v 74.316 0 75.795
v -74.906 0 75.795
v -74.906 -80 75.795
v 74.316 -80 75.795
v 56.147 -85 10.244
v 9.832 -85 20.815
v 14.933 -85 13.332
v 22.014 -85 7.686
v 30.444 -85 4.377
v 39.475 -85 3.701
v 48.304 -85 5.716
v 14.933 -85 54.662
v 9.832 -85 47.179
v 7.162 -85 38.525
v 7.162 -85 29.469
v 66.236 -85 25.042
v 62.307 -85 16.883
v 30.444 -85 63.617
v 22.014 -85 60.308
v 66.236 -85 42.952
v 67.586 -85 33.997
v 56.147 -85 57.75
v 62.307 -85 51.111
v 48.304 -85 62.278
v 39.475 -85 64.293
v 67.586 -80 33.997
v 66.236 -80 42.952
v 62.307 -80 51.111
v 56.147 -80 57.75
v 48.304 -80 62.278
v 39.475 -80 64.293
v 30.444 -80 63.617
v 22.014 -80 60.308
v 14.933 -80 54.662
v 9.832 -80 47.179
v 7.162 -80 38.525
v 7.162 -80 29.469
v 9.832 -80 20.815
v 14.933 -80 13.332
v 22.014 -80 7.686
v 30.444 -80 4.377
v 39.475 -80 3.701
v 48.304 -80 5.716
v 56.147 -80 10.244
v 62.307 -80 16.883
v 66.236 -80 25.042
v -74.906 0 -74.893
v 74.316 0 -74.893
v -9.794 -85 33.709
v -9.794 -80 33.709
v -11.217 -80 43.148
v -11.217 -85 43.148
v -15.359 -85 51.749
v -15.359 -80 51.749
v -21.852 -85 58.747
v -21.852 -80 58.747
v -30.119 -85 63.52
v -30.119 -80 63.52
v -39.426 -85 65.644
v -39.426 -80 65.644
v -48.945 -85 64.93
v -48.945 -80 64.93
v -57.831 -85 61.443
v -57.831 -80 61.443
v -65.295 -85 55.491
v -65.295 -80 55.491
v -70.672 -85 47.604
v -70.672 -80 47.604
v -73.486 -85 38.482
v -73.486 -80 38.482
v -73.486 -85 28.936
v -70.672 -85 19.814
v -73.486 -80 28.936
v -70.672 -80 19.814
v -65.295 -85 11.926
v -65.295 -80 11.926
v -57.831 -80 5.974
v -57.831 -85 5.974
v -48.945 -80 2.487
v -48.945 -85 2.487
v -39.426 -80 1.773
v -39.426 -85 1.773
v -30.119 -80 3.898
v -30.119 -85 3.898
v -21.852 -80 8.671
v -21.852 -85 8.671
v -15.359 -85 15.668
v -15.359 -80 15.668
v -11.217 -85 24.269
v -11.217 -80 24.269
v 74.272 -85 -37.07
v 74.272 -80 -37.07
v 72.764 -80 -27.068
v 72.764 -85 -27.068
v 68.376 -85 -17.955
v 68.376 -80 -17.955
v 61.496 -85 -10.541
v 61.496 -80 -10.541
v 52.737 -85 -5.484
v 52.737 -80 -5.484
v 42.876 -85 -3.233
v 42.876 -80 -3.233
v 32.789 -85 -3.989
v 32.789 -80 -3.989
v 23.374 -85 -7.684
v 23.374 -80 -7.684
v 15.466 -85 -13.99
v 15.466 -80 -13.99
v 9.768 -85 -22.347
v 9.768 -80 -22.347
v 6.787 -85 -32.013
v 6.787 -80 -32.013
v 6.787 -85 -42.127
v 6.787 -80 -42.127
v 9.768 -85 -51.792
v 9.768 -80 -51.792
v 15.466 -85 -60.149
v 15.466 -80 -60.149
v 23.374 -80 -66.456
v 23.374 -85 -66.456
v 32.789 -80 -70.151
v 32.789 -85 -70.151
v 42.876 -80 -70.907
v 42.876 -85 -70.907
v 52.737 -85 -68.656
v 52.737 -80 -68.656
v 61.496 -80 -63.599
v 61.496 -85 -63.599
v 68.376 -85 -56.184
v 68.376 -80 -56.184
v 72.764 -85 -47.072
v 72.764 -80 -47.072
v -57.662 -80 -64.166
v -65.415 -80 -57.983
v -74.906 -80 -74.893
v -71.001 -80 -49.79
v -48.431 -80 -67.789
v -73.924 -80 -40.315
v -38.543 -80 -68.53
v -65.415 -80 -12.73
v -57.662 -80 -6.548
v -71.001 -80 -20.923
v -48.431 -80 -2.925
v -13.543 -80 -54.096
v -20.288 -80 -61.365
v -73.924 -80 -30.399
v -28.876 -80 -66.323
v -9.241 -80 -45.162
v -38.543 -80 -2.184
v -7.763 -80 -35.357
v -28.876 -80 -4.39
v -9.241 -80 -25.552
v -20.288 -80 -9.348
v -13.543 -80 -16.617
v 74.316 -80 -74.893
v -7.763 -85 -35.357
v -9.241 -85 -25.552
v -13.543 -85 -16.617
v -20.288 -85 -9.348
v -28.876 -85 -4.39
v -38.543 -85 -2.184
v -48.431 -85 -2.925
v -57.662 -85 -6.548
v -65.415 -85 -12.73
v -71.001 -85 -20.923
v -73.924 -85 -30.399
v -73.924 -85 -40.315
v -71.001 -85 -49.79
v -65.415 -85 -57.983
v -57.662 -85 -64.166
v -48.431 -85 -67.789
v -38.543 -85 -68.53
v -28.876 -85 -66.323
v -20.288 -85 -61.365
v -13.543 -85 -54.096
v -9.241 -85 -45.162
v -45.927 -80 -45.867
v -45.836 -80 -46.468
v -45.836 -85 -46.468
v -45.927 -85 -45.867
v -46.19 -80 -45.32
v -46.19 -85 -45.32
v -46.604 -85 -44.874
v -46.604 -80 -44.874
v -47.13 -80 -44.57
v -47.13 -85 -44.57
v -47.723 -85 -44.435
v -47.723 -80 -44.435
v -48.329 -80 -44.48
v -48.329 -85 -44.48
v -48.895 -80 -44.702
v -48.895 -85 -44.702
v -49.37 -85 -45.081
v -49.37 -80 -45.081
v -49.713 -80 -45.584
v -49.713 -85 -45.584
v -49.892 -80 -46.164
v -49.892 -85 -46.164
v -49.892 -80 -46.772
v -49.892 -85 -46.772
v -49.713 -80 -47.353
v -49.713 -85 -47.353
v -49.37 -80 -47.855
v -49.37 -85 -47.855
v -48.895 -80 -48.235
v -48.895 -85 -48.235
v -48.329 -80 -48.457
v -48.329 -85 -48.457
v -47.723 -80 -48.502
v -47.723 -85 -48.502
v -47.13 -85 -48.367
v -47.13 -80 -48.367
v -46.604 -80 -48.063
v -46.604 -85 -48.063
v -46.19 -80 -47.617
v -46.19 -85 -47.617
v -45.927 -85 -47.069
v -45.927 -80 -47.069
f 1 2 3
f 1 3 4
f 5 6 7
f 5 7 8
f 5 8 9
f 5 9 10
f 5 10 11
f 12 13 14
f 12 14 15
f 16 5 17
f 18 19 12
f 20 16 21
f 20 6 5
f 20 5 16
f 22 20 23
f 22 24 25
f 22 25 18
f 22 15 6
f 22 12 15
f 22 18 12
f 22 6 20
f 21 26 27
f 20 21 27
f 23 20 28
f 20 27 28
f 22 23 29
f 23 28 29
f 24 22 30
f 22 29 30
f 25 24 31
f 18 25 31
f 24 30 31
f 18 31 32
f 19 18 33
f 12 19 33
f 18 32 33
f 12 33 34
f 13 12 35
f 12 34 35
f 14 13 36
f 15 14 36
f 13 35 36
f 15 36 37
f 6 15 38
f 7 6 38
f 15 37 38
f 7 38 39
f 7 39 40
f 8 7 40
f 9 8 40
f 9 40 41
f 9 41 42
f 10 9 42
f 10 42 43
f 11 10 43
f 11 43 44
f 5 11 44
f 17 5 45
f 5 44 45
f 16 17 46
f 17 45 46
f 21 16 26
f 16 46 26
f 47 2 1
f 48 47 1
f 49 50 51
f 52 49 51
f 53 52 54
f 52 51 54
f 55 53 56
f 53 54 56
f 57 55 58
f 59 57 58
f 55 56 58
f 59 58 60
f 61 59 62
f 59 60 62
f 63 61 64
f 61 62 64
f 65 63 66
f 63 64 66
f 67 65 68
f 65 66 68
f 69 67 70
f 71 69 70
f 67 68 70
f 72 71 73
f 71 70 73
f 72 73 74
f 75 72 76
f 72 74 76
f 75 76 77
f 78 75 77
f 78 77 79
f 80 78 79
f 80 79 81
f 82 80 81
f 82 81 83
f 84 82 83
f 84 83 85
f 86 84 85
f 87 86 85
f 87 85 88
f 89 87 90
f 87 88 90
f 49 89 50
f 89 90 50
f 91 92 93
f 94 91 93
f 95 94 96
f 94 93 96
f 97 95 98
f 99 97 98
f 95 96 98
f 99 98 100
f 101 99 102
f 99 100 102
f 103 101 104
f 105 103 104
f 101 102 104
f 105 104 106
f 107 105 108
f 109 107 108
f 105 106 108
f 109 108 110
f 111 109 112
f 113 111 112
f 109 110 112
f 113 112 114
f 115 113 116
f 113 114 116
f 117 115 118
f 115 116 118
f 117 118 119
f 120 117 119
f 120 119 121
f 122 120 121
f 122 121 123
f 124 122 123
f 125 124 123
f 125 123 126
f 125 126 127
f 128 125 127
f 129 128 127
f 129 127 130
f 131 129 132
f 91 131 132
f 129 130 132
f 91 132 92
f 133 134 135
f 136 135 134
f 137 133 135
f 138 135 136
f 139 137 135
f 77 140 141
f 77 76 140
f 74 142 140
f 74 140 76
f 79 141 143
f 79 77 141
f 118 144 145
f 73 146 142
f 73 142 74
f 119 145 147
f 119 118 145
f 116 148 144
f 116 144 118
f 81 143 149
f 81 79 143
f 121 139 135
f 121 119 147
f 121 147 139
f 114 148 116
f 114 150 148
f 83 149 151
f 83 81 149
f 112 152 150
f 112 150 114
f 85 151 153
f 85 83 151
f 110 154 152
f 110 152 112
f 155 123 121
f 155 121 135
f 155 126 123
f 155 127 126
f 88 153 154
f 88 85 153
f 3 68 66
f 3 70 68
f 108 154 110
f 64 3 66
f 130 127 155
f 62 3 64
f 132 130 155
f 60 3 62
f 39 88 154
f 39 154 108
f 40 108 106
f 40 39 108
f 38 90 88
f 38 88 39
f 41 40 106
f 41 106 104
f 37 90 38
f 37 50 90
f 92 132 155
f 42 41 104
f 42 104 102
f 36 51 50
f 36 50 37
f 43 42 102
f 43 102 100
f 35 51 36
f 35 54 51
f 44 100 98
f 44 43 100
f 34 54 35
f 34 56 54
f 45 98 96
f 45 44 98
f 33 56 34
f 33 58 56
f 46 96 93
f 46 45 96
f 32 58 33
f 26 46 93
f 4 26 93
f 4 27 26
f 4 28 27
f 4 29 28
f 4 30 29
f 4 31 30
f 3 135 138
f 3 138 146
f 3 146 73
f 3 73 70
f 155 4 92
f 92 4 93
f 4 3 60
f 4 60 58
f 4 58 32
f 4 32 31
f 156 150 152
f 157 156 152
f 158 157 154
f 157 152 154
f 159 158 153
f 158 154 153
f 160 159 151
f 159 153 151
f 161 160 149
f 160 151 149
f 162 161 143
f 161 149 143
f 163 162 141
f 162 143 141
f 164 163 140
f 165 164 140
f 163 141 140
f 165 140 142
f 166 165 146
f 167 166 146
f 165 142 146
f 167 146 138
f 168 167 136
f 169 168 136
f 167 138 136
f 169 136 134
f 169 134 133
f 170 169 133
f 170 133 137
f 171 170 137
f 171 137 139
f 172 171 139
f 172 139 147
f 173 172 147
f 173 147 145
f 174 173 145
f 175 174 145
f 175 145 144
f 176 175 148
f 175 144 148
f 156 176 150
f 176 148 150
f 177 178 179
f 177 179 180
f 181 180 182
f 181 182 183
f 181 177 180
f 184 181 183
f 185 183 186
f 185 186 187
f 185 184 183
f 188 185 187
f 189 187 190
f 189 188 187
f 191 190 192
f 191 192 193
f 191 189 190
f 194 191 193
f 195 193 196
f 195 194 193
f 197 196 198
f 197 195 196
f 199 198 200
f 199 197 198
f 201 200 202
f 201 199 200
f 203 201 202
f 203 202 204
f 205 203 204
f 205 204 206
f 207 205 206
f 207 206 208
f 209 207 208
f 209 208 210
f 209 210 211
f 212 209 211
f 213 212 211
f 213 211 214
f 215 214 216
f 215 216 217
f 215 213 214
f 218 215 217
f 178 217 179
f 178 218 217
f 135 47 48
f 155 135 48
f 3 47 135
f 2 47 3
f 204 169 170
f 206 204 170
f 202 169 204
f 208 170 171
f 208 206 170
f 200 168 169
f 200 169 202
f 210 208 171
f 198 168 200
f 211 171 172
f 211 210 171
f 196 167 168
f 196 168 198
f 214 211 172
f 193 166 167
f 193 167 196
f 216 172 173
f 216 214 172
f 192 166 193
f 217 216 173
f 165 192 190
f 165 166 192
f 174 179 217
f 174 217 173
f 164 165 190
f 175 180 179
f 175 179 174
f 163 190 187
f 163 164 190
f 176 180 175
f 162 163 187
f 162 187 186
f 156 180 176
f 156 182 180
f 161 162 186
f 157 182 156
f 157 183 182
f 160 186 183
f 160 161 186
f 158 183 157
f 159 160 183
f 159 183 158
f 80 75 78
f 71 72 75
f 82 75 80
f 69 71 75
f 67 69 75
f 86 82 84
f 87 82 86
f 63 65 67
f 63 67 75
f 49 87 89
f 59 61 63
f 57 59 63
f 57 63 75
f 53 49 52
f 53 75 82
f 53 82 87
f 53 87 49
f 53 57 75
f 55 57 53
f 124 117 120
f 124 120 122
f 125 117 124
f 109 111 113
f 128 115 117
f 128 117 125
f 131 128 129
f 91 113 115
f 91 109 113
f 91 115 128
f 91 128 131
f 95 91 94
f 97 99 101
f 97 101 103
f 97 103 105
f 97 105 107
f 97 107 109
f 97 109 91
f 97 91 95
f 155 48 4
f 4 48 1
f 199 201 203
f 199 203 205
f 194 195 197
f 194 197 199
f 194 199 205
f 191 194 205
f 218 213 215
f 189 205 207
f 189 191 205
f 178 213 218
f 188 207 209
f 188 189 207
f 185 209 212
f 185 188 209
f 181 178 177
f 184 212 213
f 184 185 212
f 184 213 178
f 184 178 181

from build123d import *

# Parameters (mm, degrees)
F0_W     = 149.222113
F0_H     = 150.687955
F1_DEPTH = 80
F2_R     = 32.024782
F2_R_2   = 30.381377
F3_DEPTH = 5
F4_R     = 33.265998
F4_R_2   = 2.039344
F4_R_3   = 33.931955
F5_DEPTH = 5


with BuildPart() as f1:
    # F0 (on Front) → F1 (new body)
    with BuildSketch(Plane.XZ):
        with Locations((-0.295292, 0.451285)):
            Rectangle(F0_W, F0_H)
    extrude(amount=F1_DEPTH)

    # F2 (on face) → F3 (join)
    with BuildSketch(Plane.XZ.offset(80)):
        with Locations((-41.818906, 33.70855)):
            Circle(F2_R)
        with Locations((37.204407, 33.996958)):
            Circle(F2_R_2)
    extrude(amount=F3_DEPTH)

    # F4 (on face) → F5 (join)
    with BuildSketch(Plane.XZ.offset(80)):
        with Locations((-41.029103, -35.356872)):
            Circle(F4_R)
        with Locations((-47.875438, -46.468385)):
            Circle(F4_R_2, mode=Mode.SUBTRACT)
        with Locations((40.339995, -37.069906)):
            Circle(F4_R_3)
    extrude(amount=F5_DEPTH)


solid = f1.part
